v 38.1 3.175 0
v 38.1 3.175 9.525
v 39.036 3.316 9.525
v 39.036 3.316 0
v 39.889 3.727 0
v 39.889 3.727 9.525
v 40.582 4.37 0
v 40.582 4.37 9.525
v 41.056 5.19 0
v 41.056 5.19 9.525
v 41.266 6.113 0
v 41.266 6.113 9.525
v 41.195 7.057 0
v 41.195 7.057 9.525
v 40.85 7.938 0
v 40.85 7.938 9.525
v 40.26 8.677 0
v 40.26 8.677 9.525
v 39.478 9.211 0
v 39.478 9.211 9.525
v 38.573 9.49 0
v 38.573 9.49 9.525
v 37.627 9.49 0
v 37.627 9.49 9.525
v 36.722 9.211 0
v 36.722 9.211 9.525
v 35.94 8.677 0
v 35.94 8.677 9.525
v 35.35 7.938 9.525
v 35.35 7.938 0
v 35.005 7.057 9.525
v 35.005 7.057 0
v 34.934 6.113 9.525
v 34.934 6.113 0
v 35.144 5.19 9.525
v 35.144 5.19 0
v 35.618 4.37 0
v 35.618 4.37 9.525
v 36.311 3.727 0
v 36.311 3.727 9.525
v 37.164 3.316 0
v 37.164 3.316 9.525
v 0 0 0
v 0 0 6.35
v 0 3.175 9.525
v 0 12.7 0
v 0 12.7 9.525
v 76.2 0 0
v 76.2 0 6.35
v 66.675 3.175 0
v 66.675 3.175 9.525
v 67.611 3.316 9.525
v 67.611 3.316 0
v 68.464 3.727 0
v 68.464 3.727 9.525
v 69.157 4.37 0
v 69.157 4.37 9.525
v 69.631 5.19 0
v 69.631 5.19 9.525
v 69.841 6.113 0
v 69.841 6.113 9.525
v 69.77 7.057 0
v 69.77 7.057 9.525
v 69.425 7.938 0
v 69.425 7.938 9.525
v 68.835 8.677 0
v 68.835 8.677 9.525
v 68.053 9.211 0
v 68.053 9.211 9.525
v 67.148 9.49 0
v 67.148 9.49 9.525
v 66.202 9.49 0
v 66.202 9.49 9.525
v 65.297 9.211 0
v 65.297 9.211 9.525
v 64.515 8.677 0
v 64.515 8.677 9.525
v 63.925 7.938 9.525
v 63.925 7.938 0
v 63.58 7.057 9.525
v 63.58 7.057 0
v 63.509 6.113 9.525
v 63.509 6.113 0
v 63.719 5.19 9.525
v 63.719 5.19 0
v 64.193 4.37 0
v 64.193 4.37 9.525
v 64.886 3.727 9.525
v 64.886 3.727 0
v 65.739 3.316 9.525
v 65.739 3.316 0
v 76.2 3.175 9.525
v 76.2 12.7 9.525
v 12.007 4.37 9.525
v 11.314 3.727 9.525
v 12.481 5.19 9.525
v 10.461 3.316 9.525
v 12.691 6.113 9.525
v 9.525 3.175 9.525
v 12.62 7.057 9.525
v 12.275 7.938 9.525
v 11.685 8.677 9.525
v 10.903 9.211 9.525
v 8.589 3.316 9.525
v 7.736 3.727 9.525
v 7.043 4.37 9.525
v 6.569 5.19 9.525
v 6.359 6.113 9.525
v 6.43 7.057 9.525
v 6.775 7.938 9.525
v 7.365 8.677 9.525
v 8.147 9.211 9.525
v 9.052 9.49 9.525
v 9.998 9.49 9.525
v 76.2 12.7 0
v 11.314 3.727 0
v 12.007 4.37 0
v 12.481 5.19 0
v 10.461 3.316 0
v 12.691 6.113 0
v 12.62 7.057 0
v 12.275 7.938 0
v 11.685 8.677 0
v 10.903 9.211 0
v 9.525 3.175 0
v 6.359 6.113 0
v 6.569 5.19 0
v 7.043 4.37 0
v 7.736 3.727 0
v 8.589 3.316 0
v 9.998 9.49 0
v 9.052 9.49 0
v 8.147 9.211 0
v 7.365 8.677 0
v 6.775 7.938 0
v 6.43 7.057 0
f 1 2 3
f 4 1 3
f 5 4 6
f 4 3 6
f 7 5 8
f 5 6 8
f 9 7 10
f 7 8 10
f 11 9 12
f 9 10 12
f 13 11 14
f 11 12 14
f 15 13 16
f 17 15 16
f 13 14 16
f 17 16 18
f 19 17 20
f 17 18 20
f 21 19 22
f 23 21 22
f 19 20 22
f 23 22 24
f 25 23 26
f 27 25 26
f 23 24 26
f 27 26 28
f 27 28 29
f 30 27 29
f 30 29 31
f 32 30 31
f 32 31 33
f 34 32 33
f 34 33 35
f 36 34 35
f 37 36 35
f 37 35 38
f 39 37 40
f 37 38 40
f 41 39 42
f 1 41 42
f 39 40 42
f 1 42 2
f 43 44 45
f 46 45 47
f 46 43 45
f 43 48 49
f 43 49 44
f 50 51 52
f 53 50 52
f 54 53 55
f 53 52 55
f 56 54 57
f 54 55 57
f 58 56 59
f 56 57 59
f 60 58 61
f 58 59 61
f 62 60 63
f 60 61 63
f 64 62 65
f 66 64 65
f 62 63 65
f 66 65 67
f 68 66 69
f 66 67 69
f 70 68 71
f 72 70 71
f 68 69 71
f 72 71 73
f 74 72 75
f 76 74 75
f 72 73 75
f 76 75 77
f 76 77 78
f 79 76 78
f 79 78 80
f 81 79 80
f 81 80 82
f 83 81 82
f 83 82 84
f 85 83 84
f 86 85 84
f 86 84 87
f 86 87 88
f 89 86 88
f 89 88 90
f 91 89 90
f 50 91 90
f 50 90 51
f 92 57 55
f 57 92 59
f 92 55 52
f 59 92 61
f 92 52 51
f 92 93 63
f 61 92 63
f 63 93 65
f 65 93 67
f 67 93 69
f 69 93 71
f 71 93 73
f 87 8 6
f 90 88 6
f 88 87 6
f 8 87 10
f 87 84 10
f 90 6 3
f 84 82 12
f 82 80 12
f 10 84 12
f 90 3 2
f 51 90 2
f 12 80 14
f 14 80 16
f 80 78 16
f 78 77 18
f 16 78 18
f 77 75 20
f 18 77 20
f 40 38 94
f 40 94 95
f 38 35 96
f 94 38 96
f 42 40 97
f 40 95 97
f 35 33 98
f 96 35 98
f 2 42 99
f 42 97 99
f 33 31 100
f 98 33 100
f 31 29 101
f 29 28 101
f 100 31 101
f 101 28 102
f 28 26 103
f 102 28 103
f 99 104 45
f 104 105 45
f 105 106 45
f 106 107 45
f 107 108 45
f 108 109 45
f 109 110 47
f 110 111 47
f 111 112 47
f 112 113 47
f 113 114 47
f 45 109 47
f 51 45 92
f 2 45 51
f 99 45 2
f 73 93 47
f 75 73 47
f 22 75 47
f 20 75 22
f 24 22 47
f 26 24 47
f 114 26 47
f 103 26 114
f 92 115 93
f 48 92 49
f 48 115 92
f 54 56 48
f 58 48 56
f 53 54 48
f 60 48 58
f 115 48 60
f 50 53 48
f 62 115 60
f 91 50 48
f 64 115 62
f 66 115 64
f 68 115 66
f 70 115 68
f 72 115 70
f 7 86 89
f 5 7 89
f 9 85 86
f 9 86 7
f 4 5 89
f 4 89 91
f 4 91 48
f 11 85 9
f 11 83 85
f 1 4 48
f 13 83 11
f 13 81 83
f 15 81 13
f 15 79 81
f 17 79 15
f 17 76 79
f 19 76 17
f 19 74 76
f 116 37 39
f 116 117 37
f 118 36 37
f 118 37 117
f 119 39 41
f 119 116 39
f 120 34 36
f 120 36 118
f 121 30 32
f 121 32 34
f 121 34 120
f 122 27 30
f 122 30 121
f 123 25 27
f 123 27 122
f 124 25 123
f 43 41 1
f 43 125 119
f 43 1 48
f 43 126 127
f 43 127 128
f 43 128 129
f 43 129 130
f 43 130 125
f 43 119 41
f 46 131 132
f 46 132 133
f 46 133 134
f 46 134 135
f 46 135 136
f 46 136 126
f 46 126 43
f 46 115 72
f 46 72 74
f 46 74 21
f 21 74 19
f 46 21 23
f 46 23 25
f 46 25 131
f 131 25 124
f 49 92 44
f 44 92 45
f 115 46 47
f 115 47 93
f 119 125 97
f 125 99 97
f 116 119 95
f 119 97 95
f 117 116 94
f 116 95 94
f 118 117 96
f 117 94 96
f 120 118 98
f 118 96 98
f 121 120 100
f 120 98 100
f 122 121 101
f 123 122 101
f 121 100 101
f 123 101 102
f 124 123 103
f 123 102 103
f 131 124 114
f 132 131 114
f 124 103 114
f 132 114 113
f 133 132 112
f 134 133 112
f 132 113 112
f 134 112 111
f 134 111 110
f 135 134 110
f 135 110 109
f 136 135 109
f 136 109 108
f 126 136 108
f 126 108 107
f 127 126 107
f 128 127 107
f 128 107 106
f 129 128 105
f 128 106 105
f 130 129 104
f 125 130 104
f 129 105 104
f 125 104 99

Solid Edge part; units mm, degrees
sketch "Sketch1" plane through (0, 0, 0) normal (0, 0, 1) x (1, 0, 0)
  line L0 (0, 0) -> (0, 12.7)
  line L1 (0, 12.7) -> (76.2, 12.7)
  line L2 (76.2, 12.7) -> (76.2, 0)
  line L3 (76.2, 0) -> (0, 0)
  dimension "D1" = 76.2
  dimension "D2" = 12.7
extrude "Protrusion1" add sketch "Sketch1" along normal blind 9.525
hole "Hole_1" at (38.1, 6.35, 9.525) direction (0, 0, -1) diameter 6.35 end up to next
hole "Hole1" at (66.675, 6.35, 9.525) direction (0, 0, -1) diameter 6.35 end up to next
hole "Hole2" at (9.525, 6.35, 9.525) direction (0, 0, -1) diameter 6.35 end up to next
chamfer "Chamfer_1" distance 3.175 angle 45 1 edges at (38.1, 0, 9.525)
